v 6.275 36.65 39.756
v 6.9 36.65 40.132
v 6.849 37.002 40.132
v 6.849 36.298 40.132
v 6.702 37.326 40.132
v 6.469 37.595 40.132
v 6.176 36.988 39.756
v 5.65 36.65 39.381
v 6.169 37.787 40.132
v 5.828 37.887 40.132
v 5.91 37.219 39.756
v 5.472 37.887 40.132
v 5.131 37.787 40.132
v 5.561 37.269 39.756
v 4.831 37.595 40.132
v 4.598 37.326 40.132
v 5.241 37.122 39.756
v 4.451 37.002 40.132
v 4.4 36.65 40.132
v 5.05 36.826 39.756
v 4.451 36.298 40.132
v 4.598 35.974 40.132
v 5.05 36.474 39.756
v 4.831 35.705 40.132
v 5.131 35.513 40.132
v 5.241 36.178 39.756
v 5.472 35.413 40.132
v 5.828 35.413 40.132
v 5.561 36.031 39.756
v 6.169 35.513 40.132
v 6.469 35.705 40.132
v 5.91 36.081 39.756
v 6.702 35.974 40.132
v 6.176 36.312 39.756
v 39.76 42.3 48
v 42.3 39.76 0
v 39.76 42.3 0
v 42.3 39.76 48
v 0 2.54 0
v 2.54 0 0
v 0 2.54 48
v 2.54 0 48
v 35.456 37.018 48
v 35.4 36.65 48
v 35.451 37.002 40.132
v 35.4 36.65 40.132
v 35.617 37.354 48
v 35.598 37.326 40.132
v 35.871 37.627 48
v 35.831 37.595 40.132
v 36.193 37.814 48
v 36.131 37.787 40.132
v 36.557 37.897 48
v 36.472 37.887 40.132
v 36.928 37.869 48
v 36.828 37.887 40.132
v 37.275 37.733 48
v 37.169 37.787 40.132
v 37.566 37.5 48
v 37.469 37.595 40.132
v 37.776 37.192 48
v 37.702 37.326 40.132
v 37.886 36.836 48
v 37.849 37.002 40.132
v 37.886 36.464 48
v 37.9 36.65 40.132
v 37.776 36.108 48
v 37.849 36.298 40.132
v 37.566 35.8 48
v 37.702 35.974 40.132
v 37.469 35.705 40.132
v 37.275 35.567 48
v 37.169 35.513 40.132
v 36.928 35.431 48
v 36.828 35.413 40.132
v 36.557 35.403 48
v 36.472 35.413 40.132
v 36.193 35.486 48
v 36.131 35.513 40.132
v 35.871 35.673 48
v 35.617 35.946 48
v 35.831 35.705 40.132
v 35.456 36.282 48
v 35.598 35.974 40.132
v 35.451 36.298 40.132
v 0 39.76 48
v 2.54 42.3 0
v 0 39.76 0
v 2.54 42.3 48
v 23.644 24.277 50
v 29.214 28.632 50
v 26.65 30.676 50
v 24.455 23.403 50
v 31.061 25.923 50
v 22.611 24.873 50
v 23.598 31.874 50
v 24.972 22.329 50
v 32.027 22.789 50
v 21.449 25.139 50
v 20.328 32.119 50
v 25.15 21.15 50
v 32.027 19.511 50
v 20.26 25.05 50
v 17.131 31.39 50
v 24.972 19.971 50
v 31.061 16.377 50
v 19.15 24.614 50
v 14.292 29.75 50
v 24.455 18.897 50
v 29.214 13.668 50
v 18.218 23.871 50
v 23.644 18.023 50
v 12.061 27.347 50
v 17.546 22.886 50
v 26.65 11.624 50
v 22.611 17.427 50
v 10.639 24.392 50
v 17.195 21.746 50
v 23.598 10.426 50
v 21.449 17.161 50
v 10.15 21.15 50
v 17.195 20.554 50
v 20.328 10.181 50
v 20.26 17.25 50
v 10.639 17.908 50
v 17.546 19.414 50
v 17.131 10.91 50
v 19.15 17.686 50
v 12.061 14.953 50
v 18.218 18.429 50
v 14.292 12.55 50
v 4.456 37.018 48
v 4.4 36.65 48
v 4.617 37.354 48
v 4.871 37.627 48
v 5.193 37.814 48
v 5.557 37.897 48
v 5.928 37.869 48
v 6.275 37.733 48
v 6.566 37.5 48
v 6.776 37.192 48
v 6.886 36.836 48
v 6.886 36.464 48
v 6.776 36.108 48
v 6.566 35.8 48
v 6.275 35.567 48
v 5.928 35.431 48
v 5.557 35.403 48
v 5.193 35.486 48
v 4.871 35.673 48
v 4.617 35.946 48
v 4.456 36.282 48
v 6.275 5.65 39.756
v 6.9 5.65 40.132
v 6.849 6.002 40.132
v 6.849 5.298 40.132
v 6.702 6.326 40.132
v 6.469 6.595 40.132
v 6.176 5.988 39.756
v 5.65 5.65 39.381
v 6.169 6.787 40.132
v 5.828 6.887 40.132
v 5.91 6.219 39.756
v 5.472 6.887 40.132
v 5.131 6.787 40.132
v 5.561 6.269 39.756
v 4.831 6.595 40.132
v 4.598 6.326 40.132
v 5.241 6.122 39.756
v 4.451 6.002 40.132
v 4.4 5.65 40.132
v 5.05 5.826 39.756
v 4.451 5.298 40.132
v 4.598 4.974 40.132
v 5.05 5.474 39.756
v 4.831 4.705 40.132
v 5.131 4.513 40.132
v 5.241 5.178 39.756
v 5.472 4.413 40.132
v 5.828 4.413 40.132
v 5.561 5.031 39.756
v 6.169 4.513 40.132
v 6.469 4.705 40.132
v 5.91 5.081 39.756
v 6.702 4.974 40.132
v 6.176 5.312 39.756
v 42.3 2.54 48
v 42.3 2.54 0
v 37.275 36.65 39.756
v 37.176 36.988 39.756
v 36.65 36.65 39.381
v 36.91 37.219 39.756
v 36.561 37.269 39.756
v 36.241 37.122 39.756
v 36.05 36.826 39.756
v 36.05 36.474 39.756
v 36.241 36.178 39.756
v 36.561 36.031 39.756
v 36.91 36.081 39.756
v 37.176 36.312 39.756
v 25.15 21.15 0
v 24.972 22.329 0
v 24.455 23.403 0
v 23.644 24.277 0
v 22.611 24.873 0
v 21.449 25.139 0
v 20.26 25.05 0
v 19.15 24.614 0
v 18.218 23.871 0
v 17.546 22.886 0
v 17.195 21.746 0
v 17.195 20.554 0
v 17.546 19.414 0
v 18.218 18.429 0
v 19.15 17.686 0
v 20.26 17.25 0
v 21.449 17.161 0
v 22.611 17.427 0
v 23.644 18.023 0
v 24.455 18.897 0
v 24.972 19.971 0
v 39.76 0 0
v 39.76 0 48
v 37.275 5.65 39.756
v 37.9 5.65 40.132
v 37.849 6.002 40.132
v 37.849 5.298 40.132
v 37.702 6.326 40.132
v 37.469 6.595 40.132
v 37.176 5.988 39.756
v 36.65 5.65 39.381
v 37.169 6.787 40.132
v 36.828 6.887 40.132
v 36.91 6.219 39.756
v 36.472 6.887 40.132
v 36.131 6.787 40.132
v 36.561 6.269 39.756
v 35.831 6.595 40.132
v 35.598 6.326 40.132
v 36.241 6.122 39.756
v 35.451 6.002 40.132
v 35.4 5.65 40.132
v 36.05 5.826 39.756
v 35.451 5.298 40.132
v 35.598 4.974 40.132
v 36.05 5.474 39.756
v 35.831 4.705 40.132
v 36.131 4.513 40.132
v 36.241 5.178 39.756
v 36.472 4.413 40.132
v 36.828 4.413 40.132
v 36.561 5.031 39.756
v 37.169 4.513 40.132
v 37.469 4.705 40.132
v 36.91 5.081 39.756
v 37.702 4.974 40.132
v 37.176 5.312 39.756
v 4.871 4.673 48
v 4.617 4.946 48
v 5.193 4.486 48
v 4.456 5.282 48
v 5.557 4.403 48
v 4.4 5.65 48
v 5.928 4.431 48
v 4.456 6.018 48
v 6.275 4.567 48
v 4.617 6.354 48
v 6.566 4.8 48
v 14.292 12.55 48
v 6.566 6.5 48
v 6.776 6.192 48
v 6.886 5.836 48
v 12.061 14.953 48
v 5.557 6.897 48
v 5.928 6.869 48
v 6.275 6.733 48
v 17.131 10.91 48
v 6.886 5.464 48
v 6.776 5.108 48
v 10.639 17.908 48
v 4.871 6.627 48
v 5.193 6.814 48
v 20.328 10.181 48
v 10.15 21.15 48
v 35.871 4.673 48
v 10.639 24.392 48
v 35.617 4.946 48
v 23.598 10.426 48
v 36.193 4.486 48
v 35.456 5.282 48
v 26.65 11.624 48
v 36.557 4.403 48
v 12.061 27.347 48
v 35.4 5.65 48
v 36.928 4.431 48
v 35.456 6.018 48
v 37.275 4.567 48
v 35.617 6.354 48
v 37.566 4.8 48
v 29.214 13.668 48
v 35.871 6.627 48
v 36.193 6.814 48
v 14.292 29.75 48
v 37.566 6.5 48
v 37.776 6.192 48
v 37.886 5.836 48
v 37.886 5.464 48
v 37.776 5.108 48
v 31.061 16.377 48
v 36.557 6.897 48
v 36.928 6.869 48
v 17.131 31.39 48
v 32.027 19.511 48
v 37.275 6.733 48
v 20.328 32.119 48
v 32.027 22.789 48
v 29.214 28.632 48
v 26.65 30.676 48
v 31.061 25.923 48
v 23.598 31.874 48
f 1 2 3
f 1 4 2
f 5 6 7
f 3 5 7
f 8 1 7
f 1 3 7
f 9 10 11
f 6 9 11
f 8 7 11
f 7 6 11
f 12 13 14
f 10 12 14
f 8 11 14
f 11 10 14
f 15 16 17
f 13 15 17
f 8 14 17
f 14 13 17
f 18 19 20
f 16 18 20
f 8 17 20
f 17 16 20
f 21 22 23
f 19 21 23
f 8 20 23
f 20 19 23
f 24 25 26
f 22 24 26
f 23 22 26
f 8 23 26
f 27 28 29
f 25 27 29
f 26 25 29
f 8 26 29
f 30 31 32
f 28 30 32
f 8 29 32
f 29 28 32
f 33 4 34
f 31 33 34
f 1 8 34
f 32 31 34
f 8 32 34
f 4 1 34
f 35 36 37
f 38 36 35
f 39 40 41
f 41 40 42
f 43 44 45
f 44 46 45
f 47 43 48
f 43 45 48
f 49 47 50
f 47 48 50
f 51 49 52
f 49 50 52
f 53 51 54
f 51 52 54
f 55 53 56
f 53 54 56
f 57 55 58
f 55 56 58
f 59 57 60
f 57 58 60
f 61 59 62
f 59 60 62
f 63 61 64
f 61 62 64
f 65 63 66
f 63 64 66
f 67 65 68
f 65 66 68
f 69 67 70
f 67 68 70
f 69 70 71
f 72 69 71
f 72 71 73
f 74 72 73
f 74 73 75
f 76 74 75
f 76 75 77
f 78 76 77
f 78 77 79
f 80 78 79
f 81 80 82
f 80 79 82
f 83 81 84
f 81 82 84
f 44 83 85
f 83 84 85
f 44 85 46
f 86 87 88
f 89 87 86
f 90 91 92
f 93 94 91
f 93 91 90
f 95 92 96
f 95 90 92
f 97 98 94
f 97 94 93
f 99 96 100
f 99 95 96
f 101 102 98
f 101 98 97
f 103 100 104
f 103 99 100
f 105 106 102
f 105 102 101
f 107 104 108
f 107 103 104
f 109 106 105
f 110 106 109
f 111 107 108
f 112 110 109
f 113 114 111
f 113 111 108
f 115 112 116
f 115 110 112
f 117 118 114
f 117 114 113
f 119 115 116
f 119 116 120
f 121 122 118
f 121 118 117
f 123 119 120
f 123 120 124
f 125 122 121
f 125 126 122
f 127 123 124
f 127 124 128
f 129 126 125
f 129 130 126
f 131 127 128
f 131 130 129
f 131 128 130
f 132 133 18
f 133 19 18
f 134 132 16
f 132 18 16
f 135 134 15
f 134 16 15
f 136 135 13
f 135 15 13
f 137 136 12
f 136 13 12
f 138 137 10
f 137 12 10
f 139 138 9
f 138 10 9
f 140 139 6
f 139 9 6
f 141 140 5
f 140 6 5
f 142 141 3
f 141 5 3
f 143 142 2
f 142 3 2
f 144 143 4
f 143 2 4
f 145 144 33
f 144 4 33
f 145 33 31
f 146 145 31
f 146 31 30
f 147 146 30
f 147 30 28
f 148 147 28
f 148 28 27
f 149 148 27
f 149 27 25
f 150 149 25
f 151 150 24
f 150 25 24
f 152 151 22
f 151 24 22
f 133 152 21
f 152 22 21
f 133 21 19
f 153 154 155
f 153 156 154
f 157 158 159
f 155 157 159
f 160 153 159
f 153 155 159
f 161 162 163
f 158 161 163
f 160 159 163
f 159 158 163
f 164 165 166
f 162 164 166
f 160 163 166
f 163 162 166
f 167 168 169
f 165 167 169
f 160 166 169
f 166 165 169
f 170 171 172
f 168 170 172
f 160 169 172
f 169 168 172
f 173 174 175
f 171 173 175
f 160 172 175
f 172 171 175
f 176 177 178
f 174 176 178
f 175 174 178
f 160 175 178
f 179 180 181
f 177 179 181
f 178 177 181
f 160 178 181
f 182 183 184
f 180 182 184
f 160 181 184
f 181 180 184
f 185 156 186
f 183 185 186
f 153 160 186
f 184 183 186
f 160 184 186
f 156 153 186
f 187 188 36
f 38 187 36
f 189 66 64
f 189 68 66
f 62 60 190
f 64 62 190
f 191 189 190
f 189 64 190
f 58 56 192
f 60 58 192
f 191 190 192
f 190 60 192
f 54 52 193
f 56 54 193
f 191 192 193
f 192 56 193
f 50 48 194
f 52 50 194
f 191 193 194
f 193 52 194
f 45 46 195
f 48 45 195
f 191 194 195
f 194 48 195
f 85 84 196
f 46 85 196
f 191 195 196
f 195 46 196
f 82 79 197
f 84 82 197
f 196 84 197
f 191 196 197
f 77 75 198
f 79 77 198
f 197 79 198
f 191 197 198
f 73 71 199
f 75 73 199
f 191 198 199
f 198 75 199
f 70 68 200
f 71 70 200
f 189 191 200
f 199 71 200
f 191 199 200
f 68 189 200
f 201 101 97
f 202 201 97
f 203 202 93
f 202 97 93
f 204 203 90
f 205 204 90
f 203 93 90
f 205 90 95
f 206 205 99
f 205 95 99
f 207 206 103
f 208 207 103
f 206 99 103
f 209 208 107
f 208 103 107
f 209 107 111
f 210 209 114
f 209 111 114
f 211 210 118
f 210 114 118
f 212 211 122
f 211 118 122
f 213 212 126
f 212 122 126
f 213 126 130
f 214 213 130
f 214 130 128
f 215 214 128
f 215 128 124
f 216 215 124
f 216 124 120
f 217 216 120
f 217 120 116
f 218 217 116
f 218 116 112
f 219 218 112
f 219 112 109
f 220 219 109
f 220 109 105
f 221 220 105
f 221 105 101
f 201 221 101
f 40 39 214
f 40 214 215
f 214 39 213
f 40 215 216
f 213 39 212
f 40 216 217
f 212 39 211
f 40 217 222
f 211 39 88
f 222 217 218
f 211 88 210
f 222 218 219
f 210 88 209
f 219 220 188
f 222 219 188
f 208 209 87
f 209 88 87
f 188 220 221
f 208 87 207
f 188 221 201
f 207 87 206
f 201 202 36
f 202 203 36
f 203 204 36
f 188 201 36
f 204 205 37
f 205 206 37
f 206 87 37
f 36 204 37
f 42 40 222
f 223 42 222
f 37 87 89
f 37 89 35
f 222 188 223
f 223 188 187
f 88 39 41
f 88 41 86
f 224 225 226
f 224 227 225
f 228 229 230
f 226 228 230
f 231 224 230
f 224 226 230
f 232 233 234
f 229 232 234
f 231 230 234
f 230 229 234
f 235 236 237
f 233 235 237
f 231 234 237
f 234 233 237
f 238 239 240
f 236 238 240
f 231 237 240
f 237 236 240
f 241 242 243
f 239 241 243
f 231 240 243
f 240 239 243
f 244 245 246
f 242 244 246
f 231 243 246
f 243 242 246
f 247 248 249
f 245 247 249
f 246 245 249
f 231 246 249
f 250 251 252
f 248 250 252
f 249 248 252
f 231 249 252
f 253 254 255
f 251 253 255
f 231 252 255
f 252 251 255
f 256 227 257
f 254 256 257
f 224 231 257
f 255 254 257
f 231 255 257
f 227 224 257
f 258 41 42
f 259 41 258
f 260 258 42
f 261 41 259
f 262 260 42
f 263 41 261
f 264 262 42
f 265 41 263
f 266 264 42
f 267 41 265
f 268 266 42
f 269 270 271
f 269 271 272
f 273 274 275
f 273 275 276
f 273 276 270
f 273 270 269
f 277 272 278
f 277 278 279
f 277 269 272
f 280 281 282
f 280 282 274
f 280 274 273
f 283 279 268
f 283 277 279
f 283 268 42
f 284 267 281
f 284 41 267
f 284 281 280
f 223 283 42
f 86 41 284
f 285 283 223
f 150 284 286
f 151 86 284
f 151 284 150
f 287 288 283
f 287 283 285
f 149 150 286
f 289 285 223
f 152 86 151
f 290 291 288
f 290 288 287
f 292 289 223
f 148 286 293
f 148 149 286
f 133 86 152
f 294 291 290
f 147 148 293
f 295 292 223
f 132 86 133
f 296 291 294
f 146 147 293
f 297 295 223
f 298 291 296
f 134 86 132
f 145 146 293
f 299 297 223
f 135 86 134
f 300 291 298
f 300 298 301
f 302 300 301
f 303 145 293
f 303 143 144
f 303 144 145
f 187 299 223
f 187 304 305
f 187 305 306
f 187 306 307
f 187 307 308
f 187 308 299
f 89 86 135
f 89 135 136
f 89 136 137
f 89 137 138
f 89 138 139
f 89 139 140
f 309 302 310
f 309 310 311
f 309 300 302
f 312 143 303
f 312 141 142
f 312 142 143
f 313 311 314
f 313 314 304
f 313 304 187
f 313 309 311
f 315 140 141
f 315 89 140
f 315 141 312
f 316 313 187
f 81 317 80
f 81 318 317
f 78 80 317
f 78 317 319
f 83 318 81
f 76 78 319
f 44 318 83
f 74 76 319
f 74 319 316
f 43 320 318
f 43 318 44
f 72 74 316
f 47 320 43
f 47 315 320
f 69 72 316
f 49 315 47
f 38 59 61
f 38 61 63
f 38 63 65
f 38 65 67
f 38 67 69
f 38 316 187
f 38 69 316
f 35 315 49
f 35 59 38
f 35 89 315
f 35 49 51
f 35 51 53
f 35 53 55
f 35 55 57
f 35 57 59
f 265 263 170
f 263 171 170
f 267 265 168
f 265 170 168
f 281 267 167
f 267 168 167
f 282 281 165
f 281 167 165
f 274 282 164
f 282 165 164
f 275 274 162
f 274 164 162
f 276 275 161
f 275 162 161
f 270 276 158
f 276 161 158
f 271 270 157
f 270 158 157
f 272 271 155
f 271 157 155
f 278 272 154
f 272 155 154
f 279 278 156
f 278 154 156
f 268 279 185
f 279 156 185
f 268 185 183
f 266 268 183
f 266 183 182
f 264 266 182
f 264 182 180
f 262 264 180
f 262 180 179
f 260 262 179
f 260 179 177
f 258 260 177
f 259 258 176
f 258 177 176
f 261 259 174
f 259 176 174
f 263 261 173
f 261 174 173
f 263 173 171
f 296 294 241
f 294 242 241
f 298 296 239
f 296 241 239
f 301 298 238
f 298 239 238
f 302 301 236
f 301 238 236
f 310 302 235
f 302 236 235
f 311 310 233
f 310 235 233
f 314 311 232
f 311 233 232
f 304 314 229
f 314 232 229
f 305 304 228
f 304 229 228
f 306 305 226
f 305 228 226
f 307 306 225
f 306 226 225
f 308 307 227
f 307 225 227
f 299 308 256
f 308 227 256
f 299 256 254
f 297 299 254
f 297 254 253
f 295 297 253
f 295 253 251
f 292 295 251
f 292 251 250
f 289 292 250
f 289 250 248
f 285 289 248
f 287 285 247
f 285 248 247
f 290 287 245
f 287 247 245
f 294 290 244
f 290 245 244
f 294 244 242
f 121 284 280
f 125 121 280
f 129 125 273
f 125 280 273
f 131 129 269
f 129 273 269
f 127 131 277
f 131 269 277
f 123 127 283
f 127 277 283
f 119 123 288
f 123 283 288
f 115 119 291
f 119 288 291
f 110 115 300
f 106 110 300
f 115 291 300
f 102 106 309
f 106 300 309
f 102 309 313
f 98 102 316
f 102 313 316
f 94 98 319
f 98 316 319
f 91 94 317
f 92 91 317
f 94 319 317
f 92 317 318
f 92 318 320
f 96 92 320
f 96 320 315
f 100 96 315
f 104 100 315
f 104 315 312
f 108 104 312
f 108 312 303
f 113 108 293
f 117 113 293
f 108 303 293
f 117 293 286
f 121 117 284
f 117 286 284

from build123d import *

# Parameters (mm, degrees)
SKETCH1_W                       = 42.3
SKETCH1_H                       = 42.3
BOSS_EXTRUDE1_DEPTH             = 48
TAP_DRILL_FOR_M3X0_5_TAP1_D     = 2.5
TAP_DRILL_FOR_M3X0_5_TAP1_DEPTH = 7.868
TAP_DRILL_FOR_M3X0_5_TAP1_TIP   = 0.751075774
SKETCH5_R                       = 11
BOSS_EXTRUDE2_DEPTH             = 2
SKETCH6_R                       = 4
CUT_EXTRUDE1_DEPTH              = 78.965248669
CHAMFER1_SIZE                   = 2.54


with BuildPart() as part:
    # Sketch1 → Boss-Extrude1 (new body)
    with BuildSketch(Plane.XY):
        with Locations((21.15, 21.15)):
            Rectangle(SKETCH1_W, SKETCH1_H)
    extrude(amount=BOSS_EXTRUDE1_DEPTH)

    # Tap Drill for M3x0.5 Tap1
    with Locations(Plane.XY.offset(48)):
        with Locations((36.65, 5.65), (36.65, 36.65), (5.65, 5.65), (5.65, 36.65)):
            Hole(TAP_DRILL_FOR_M3X0_5_TAP1_D / 2, depth=TAP_DRILL_FOR_M3X0_5_TAP1_DEPTH)
            with Locations((0, 0, -(TAP_DRILL_FOR_M3X0_5_TAP1_DEPTH + TAP_DRILL_FOR_M3X0_5_TAP1_TIP / 2))):  # 118° drill point
                Cone(0, TAP_DRILL_FOR_M3X0_5_TAP1_D / 2, TAP_DRILL_FOR_M3X0_5_TAP1_TIP, mode=Mode.SUBTRACT)

    # Sketch5 → Boss-Extrude2 (add)
    with BuildSketch(Plane.XY.offset(48)):
        with Locations(Location((21.15, 21.15, 0), (0, 0, 180))):
            Circle(SKETCH5_R)
    extrude(amount=BOSS_EXTRUDE2_DEPTH)

    # Sketch6 → Cut-Extrude1 (cut, through all)
    with BuildSketch(Plane.XY.offset(50)):
        with Locations((21.15, 21.15)):
            Circle(SKETCH6_R)
    extrude(amount=-CUT_EXTRUDE1_DEPTH, mode=Mode.SUBTRACT)

    # Chamfer1
    chamfer1_edges = [part.edges().sort_by_distance(p)[0] for p in [
        (0, 42.3, 24),
        (42.3, 42.3, 24),
        (42.3, 0, 24),
        (0, 0, 24),
    ]]
    chamfer(chamfer1_edges, length=CHAMFER1_SIZE)


solid = part.part
